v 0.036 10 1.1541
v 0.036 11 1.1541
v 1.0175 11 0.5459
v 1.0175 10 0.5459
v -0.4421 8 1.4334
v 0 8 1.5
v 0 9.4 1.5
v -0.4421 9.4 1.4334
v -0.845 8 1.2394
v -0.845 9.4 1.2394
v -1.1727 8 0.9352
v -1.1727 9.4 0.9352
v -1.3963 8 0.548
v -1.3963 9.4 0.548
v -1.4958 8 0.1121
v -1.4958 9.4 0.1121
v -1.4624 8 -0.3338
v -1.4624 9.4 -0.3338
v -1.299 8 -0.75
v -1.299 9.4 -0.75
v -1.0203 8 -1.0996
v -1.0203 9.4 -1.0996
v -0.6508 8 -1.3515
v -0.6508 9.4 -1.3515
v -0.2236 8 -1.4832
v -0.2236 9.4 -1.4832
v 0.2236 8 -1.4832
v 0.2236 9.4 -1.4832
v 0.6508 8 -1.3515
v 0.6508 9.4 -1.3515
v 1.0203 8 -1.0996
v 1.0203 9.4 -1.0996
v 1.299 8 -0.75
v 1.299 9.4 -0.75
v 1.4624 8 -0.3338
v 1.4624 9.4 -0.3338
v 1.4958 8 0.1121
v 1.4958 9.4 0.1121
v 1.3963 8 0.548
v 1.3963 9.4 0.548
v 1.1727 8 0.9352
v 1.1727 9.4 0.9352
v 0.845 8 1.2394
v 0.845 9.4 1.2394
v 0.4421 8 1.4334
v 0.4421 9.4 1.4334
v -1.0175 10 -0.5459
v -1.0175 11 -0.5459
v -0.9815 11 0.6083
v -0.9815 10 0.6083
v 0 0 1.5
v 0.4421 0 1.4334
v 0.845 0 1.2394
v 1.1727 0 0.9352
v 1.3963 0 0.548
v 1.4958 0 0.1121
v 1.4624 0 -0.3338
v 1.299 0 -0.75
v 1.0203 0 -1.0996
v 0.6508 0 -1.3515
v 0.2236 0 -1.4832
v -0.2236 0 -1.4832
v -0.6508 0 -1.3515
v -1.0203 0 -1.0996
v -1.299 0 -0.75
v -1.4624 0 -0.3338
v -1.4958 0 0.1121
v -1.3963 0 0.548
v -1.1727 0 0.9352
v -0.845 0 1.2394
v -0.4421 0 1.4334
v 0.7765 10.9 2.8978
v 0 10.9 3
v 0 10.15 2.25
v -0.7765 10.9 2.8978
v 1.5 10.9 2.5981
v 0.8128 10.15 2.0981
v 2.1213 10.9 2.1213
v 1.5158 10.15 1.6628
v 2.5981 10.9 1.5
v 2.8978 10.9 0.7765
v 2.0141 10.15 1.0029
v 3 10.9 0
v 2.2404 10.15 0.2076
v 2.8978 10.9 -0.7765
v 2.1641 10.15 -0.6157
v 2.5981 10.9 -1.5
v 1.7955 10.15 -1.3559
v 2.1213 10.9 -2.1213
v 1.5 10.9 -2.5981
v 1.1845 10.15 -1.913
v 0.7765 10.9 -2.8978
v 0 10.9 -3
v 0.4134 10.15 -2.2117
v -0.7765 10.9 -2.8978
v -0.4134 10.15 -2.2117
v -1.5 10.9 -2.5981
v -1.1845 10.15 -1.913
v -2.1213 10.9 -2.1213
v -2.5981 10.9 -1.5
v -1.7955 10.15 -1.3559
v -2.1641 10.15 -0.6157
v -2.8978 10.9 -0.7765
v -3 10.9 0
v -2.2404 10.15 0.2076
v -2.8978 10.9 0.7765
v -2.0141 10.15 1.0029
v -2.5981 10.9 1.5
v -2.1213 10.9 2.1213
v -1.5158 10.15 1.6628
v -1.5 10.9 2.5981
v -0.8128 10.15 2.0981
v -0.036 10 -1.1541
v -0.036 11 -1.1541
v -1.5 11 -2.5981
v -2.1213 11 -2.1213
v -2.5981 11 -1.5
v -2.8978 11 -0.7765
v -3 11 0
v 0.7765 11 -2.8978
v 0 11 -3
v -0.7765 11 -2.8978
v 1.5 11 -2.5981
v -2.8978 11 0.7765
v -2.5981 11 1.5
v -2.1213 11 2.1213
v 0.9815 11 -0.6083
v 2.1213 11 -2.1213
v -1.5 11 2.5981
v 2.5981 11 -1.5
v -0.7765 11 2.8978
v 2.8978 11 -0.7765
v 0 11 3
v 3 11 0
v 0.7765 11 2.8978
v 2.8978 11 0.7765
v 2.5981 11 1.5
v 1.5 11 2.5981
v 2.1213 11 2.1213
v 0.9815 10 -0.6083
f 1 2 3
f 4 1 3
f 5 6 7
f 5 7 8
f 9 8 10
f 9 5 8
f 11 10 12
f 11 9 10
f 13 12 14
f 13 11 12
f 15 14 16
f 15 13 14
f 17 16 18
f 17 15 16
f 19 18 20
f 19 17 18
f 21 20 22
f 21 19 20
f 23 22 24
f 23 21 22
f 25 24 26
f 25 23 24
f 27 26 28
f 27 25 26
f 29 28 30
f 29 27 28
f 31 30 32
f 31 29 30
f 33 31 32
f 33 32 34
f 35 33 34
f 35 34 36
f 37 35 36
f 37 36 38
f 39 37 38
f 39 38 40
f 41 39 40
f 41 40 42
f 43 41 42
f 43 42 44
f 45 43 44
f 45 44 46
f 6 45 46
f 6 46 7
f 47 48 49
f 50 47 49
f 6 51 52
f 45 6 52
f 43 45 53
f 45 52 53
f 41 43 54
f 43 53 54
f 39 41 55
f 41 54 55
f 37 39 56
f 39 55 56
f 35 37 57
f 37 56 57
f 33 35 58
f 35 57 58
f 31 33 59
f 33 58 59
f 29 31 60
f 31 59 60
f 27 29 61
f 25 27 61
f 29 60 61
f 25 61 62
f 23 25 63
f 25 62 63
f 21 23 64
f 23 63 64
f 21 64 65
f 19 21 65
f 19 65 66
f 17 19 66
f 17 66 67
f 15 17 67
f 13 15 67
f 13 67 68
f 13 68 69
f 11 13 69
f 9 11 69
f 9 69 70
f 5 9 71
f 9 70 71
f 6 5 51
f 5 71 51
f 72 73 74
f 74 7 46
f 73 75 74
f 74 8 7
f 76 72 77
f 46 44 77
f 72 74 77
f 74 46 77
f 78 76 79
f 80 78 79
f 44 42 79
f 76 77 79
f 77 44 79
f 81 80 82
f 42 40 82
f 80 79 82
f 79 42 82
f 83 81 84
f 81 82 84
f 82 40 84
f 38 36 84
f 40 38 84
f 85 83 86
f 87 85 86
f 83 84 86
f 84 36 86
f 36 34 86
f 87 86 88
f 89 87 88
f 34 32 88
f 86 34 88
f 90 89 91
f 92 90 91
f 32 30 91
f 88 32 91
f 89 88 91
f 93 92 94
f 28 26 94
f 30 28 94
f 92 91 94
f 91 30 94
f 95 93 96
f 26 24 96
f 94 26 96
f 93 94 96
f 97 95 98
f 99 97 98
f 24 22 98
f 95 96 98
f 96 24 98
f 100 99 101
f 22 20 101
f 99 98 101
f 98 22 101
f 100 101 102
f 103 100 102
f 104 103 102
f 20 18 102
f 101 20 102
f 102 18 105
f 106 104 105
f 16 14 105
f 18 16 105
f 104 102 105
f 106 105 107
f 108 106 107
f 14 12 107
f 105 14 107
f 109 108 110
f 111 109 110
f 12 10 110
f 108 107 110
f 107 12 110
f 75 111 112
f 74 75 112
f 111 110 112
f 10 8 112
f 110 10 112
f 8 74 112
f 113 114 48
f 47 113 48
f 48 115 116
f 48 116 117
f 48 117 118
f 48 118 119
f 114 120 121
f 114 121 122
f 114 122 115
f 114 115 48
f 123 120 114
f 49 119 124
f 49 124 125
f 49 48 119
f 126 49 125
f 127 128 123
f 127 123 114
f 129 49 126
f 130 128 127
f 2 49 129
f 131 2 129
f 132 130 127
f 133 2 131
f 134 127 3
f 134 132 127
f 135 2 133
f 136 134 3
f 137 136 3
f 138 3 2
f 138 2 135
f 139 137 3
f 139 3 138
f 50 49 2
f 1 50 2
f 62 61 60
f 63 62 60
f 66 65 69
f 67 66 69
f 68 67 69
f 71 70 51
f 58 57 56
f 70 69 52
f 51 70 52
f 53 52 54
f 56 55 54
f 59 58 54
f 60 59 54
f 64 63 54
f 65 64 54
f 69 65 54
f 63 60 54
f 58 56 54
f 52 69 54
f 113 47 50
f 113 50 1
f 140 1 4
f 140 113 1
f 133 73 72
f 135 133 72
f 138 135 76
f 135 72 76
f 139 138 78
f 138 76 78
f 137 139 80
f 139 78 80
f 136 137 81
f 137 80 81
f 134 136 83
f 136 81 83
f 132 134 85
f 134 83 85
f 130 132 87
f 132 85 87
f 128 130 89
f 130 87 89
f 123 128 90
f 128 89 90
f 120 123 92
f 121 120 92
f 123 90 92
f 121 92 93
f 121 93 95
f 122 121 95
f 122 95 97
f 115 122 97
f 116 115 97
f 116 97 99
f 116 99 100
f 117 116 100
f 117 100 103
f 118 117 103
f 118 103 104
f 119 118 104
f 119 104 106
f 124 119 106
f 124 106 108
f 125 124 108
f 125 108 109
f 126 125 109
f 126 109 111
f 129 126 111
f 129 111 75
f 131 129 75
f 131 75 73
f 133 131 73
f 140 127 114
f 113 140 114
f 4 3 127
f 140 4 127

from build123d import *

# Parameters (mm, degrees)
SKETCH_1_R          = 1.5
EXTRUDE_1_DEPTH     = 8
SKETCH_2_R          = 3
EXTRUDE_2_DEPTH     = 3
CHAMFER_1_SIZE      = 2.9
CUT_EXTRUDE_1_DEPTH = 1


with BuildPart() as part:
    # 草图1 → 凸台-拉伸1 (new body)
    with BuildSketch(Plane(origin=(0, 0, 0), x_dir=(1, 0, 0), z_dir=(0, 1, 0))):
        with Locations(Location((0, 0, 0), (0, 0, 270))):
            Circle(SKETCH_1_R)
    extrude(amount=EXTRUDE_1_DEPTH)

    # 草图2 → 凸台-拉伸2 (add)
    with BuildSketch(Plane(origin=(0, 8, 0), x_dir=(1, 0, 0), z_dir=(0, 1, 0))):
        with Locations(Location((0, 0, 0), (0, 0, 270))):
            Circle(SKETCH_2_R)
    extrude(amount=EXTRUDE_2_DEPTH)

    # 倒角1
    # the kernel refuses this chamfer: 2.9 mm, written as the material it takes off along each edge
    with BuildSketch(Plane(origin=(0, 8, 0), x_dir=(0, 0, 1), z_dir=(-1, 0, 0))) as chamfer_1_piece_1_section:
        Polygon((3, CHAMFER_1_SIZE), (3 - CHAMFER_1_SIZE, 0), (3, 0), align=None)
    chamfer_1_piece_1 = revolve(axis=Axis((0, 8, 0), (0, 1, 0)), mode=Mode.PRIVATE)
    chamfer_1_piece_1 = chamfer_1_piece_1 - Plane(origin=(0, 10.16453564, 0), x_dir=(0, 0, 1), z_dir=(0, -1, 0)) * Cylinder(1.5, 12, mode=Mode.PRIVATE)
    add(chamfer_1_piece_1, mode=Mode.SUBTRACT)

    # 草图3 → 切除-拉伸1 (cut)
    with BuildSketch(Plane(origin=(0, 11, 0), x_dir=(1, 0, 0), z_dir=(0, 1, 0))):
        Polygon((1.017530084, -0.545862493), (0.981495828, 0.608275655), (-0.036034256, 1.154138148), (-1.017530084, 0.545862493), (-0.981495828, -0.608275655), (0.036034256, -1.154138148), align=None)
    extrude(amount=-CUT_EXTRUDE_1_DEPTH, mode=Mode.SUBTRACT)


solid = part.part
